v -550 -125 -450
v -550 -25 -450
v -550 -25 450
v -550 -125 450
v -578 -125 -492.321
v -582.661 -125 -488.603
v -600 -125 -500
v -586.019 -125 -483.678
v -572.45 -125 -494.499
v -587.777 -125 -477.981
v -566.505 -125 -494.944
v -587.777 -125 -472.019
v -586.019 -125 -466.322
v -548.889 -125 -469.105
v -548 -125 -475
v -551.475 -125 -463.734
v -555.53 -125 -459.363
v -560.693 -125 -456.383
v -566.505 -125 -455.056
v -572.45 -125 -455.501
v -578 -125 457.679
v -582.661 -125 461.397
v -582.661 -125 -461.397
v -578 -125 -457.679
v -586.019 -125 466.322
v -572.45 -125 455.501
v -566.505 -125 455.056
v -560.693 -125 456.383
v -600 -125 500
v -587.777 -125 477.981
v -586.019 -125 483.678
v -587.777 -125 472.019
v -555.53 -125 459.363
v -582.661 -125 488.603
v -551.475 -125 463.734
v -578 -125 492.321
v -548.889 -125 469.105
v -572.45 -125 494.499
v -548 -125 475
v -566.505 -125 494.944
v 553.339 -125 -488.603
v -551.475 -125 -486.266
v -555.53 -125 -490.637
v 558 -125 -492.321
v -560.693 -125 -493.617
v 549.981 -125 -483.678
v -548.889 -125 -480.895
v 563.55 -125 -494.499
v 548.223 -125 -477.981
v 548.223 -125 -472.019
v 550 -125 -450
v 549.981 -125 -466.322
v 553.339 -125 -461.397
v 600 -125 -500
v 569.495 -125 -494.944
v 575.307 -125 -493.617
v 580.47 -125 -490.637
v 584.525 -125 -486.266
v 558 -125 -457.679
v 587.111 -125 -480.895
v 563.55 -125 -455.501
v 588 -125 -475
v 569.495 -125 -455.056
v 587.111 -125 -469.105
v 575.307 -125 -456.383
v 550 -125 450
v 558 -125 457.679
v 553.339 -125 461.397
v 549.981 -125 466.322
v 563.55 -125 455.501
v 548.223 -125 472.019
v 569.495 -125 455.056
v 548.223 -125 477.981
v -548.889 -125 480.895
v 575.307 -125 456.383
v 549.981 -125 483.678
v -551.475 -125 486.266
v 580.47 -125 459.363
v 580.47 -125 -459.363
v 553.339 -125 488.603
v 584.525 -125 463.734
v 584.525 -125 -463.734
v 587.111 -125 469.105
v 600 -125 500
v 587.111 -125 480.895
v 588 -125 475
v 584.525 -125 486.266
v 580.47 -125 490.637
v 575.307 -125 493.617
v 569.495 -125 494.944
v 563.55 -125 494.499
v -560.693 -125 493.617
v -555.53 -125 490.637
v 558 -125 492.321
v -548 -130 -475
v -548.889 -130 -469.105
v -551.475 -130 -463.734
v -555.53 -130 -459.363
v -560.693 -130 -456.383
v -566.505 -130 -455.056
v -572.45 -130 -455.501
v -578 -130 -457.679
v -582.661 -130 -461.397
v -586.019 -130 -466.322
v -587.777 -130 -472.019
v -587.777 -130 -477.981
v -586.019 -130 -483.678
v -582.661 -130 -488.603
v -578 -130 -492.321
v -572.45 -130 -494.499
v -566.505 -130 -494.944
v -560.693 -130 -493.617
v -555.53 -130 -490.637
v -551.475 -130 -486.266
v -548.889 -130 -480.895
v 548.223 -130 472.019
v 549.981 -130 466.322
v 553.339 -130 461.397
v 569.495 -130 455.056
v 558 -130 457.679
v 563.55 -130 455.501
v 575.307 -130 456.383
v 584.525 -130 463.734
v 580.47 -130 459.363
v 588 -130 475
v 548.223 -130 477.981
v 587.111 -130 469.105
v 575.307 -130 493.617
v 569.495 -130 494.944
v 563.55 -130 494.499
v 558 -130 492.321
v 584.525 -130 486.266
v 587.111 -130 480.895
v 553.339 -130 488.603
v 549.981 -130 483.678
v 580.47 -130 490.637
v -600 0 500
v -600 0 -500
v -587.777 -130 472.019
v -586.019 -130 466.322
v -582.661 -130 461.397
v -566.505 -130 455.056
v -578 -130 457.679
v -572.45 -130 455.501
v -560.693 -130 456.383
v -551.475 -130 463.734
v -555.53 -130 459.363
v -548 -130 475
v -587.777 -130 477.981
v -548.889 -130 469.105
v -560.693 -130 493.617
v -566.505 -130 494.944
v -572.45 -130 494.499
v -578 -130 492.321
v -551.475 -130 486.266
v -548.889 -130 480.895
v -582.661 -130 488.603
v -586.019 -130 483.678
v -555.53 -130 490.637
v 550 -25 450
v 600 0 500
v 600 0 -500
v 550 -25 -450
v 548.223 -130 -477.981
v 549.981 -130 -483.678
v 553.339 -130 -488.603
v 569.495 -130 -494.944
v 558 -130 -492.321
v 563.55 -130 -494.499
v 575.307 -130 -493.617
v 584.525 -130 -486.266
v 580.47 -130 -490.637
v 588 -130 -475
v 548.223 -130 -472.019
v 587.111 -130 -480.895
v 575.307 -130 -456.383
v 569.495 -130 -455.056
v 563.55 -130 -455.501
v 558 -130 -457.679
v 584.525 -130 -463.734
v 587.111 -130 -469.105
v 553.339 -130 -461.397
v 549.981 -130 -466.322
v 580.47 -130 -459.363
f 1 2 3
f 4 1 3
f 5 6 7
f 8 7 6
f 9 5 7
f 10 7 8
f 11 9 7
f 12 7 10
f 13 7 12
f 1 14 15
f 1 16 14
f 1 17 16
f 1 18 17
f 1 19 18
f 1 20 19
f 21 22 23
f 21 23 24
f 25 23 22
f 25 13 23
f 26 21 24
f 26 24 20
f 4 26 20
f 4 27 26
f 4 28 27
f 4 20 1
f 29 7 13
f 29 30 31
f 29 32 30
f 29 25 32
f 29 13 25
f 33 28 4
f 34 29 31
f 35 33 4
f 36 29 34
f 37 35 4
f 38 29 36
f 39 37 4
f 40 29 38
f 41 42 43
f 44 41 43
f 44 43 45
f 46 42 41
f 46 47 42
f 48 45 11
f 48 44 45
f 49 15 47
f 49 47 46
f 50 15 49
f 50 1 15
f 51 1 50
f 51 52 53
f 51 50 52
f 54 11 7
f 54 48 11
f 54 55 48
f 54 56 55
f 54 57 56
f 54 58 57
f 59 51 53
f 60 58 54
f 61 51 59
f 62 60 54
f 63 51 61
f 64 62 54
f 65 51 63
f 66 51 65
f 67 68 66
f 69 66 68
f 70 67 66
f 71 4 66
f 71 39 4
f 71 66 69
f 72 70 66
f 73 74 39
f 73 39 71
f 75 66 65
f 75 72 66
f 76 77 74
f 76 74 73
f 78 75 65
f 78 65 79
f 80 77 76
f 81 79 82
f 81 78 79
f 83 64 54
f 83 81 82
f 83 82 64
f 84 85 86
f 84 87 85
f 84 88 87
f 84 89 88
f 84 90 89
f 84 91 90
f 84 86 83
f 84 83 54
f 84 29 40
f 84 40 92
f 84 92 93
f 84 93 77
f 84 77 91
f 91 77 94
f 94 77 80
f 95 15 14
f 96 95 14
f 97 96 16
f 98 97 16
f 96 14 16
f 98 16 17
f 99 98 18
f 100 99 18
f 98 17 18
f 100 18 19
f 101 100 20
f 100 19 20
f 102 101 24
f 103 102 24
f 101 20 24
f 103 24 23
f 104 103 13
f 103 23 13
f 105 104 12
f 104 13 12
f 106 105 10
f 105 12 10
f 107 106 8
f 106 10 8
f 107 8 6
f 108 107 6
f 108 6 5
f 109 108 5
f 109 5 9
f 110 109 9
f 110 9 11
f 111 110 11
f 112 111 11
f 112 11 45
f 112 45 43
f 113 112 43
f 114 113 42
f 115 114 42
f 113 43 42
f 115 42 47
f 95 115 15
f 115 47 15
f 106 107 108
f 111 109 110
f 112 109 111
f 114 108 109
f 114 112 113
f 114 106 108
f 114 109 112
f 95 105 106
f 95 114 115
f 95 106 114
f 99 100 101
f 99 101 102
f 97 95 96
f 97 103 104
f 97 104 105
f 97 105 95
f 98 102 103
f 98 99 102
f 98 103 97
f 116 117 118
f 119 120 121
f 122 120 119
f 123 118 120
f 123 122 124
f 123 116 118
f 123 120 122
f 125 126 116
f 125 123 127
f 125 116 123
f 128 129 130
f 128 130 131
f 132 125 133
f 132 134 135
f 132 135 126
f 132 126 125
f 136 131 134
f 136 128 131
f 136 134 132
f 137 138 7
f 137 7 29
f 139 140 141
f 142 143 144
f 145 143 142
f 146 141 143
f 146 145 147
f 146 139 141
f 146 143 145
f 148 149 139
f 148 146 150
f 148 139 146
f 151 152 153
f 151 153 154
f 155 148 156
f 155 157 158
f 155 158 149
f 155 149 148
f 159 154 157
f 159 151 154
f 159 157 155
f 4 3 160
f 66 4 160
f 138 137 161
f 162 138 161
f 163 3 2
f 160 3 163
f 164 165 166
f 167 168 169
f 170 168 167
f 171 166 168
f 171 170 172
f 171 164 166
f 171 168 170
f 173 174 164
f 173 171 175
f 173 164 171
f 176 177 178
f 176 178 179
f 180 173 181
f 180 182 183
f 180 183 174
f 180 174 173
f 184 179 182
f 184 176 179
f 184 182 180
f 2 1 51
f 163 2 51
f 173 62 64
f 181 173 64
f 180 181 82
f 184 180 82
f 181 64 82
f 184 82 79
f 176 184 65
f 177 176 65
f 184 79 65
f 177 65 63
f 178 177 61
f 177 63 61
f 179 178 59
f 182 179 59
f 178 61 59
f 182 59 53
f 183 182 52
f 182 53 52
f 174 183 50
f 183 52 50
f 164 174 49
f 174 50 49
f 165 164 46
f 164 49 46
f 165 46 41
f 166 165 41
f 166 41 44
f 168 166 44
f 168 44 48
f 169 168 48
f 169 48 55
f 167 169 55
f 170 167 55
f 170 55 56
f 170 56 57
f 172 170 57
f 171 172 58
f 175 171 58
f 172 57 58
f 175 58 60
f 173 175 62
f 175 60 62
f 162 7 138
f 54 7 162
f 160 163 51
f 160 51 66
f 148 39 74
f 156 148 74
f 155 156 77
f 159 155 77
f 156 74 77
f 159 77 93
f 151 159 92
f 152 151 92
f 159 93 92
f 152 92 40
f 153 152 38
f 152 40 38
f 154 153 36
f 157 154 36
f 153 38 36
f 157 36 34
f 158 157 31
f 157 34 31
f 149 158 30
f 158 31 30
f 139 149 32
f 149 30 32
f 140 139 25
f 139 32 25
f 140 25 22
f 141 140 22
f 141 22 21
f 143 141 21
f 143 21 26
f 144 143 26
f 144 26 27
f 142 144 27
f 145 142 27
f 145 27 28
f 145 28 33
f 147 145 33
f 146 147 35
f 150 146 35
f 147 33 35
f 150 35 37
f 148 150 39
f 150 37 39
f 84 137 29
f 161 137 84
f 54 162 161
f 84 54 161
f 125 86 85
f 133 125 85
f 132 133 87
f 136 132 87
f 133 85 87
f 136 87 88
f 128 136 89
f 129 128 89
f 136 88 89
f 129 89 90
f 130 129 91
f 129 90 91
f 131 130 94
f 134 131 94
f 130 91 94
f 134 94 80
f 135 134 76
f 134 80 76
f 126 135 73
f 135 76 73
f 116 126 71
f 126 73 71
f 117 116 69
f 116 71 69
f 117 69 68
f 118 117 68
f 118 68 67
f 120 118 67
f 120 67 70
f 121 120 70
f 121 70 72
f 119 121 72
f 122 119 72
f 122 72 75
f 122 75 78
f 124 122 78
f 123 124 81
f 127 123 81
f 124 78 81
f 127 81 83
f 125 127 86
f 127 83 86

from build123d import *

# Parameters (mm, degrees)
F0_W      = 1200
F0_H      = 1000
F1_DEPTH  = 25
F2_W      = 1200
F2_H      = 100
F3_DEPTH  = 50
F4_W      = 1200
F4_H      = 100
F5_DEPTH  = 50
F6_R      = 20
F7_DEPTH  = 5
F8_W      = 50
F8_H      = 900
F9_DEPTH  = 100
F10_W     = 50
F10_H     = 900
F11_DEPTH = 100


with BuildPart() as f1:
    # F0 (on Front) → F1 (new body)
    with BuildSketch(Plane.XZ):
        Rectangle(F0_W, F0_H)
    extrude(amount=F1_DEPTH)

    # F2 (on face) → F3 (join)
    with BuildSketch(Plane.XY.offset(500)):
        with Locations((0, -75)):
            Rectangle(F2_W, F2_H)
    extrude(amount=-F3_DEPTH)

    # F4 (on face) → F5 (join)
    with BuildSketch(Plane(origin=(0, 0, -500), x_dir=(1, 0, 0), z_dir=(0, 0, -1))):
        with Locations((0, 75)):
            Rectangle(F4_W, F4_H)
    extrude(amount=-F5_DEPTH)

    # F6 (on face) → F7 (join)
    with BuildSketch(Plane.XZ.offset(125)):
        with Locations((-568, 475)):
            Circle(F6_R)
        with Locations((568, 475)):
            Circle(F6_R)
        with Locations((-568, -475)):
            Circle(F6_R)
        with Locations((568, -475)):
            Circle(F6_R)
    extrude(amount=F7_DEPTH)

    # F8 (on face) → F9 (join)
    with BuildSketch(Plane.XZ.offset(25)):
        with Locations((575, 0)):
            Rectangle(F8_W, F8_H)
    extrude(amount=F9_DEPTH)

    # F10 (on face) → F11 (join)
    with BuildSketch(Plane.XZ.offset(25)):
        with Locations((-575, 0)):
            Rectangle(F10_W, F10_H)
    extrude(amount=F11_DEPTH)


solid = f1.part
